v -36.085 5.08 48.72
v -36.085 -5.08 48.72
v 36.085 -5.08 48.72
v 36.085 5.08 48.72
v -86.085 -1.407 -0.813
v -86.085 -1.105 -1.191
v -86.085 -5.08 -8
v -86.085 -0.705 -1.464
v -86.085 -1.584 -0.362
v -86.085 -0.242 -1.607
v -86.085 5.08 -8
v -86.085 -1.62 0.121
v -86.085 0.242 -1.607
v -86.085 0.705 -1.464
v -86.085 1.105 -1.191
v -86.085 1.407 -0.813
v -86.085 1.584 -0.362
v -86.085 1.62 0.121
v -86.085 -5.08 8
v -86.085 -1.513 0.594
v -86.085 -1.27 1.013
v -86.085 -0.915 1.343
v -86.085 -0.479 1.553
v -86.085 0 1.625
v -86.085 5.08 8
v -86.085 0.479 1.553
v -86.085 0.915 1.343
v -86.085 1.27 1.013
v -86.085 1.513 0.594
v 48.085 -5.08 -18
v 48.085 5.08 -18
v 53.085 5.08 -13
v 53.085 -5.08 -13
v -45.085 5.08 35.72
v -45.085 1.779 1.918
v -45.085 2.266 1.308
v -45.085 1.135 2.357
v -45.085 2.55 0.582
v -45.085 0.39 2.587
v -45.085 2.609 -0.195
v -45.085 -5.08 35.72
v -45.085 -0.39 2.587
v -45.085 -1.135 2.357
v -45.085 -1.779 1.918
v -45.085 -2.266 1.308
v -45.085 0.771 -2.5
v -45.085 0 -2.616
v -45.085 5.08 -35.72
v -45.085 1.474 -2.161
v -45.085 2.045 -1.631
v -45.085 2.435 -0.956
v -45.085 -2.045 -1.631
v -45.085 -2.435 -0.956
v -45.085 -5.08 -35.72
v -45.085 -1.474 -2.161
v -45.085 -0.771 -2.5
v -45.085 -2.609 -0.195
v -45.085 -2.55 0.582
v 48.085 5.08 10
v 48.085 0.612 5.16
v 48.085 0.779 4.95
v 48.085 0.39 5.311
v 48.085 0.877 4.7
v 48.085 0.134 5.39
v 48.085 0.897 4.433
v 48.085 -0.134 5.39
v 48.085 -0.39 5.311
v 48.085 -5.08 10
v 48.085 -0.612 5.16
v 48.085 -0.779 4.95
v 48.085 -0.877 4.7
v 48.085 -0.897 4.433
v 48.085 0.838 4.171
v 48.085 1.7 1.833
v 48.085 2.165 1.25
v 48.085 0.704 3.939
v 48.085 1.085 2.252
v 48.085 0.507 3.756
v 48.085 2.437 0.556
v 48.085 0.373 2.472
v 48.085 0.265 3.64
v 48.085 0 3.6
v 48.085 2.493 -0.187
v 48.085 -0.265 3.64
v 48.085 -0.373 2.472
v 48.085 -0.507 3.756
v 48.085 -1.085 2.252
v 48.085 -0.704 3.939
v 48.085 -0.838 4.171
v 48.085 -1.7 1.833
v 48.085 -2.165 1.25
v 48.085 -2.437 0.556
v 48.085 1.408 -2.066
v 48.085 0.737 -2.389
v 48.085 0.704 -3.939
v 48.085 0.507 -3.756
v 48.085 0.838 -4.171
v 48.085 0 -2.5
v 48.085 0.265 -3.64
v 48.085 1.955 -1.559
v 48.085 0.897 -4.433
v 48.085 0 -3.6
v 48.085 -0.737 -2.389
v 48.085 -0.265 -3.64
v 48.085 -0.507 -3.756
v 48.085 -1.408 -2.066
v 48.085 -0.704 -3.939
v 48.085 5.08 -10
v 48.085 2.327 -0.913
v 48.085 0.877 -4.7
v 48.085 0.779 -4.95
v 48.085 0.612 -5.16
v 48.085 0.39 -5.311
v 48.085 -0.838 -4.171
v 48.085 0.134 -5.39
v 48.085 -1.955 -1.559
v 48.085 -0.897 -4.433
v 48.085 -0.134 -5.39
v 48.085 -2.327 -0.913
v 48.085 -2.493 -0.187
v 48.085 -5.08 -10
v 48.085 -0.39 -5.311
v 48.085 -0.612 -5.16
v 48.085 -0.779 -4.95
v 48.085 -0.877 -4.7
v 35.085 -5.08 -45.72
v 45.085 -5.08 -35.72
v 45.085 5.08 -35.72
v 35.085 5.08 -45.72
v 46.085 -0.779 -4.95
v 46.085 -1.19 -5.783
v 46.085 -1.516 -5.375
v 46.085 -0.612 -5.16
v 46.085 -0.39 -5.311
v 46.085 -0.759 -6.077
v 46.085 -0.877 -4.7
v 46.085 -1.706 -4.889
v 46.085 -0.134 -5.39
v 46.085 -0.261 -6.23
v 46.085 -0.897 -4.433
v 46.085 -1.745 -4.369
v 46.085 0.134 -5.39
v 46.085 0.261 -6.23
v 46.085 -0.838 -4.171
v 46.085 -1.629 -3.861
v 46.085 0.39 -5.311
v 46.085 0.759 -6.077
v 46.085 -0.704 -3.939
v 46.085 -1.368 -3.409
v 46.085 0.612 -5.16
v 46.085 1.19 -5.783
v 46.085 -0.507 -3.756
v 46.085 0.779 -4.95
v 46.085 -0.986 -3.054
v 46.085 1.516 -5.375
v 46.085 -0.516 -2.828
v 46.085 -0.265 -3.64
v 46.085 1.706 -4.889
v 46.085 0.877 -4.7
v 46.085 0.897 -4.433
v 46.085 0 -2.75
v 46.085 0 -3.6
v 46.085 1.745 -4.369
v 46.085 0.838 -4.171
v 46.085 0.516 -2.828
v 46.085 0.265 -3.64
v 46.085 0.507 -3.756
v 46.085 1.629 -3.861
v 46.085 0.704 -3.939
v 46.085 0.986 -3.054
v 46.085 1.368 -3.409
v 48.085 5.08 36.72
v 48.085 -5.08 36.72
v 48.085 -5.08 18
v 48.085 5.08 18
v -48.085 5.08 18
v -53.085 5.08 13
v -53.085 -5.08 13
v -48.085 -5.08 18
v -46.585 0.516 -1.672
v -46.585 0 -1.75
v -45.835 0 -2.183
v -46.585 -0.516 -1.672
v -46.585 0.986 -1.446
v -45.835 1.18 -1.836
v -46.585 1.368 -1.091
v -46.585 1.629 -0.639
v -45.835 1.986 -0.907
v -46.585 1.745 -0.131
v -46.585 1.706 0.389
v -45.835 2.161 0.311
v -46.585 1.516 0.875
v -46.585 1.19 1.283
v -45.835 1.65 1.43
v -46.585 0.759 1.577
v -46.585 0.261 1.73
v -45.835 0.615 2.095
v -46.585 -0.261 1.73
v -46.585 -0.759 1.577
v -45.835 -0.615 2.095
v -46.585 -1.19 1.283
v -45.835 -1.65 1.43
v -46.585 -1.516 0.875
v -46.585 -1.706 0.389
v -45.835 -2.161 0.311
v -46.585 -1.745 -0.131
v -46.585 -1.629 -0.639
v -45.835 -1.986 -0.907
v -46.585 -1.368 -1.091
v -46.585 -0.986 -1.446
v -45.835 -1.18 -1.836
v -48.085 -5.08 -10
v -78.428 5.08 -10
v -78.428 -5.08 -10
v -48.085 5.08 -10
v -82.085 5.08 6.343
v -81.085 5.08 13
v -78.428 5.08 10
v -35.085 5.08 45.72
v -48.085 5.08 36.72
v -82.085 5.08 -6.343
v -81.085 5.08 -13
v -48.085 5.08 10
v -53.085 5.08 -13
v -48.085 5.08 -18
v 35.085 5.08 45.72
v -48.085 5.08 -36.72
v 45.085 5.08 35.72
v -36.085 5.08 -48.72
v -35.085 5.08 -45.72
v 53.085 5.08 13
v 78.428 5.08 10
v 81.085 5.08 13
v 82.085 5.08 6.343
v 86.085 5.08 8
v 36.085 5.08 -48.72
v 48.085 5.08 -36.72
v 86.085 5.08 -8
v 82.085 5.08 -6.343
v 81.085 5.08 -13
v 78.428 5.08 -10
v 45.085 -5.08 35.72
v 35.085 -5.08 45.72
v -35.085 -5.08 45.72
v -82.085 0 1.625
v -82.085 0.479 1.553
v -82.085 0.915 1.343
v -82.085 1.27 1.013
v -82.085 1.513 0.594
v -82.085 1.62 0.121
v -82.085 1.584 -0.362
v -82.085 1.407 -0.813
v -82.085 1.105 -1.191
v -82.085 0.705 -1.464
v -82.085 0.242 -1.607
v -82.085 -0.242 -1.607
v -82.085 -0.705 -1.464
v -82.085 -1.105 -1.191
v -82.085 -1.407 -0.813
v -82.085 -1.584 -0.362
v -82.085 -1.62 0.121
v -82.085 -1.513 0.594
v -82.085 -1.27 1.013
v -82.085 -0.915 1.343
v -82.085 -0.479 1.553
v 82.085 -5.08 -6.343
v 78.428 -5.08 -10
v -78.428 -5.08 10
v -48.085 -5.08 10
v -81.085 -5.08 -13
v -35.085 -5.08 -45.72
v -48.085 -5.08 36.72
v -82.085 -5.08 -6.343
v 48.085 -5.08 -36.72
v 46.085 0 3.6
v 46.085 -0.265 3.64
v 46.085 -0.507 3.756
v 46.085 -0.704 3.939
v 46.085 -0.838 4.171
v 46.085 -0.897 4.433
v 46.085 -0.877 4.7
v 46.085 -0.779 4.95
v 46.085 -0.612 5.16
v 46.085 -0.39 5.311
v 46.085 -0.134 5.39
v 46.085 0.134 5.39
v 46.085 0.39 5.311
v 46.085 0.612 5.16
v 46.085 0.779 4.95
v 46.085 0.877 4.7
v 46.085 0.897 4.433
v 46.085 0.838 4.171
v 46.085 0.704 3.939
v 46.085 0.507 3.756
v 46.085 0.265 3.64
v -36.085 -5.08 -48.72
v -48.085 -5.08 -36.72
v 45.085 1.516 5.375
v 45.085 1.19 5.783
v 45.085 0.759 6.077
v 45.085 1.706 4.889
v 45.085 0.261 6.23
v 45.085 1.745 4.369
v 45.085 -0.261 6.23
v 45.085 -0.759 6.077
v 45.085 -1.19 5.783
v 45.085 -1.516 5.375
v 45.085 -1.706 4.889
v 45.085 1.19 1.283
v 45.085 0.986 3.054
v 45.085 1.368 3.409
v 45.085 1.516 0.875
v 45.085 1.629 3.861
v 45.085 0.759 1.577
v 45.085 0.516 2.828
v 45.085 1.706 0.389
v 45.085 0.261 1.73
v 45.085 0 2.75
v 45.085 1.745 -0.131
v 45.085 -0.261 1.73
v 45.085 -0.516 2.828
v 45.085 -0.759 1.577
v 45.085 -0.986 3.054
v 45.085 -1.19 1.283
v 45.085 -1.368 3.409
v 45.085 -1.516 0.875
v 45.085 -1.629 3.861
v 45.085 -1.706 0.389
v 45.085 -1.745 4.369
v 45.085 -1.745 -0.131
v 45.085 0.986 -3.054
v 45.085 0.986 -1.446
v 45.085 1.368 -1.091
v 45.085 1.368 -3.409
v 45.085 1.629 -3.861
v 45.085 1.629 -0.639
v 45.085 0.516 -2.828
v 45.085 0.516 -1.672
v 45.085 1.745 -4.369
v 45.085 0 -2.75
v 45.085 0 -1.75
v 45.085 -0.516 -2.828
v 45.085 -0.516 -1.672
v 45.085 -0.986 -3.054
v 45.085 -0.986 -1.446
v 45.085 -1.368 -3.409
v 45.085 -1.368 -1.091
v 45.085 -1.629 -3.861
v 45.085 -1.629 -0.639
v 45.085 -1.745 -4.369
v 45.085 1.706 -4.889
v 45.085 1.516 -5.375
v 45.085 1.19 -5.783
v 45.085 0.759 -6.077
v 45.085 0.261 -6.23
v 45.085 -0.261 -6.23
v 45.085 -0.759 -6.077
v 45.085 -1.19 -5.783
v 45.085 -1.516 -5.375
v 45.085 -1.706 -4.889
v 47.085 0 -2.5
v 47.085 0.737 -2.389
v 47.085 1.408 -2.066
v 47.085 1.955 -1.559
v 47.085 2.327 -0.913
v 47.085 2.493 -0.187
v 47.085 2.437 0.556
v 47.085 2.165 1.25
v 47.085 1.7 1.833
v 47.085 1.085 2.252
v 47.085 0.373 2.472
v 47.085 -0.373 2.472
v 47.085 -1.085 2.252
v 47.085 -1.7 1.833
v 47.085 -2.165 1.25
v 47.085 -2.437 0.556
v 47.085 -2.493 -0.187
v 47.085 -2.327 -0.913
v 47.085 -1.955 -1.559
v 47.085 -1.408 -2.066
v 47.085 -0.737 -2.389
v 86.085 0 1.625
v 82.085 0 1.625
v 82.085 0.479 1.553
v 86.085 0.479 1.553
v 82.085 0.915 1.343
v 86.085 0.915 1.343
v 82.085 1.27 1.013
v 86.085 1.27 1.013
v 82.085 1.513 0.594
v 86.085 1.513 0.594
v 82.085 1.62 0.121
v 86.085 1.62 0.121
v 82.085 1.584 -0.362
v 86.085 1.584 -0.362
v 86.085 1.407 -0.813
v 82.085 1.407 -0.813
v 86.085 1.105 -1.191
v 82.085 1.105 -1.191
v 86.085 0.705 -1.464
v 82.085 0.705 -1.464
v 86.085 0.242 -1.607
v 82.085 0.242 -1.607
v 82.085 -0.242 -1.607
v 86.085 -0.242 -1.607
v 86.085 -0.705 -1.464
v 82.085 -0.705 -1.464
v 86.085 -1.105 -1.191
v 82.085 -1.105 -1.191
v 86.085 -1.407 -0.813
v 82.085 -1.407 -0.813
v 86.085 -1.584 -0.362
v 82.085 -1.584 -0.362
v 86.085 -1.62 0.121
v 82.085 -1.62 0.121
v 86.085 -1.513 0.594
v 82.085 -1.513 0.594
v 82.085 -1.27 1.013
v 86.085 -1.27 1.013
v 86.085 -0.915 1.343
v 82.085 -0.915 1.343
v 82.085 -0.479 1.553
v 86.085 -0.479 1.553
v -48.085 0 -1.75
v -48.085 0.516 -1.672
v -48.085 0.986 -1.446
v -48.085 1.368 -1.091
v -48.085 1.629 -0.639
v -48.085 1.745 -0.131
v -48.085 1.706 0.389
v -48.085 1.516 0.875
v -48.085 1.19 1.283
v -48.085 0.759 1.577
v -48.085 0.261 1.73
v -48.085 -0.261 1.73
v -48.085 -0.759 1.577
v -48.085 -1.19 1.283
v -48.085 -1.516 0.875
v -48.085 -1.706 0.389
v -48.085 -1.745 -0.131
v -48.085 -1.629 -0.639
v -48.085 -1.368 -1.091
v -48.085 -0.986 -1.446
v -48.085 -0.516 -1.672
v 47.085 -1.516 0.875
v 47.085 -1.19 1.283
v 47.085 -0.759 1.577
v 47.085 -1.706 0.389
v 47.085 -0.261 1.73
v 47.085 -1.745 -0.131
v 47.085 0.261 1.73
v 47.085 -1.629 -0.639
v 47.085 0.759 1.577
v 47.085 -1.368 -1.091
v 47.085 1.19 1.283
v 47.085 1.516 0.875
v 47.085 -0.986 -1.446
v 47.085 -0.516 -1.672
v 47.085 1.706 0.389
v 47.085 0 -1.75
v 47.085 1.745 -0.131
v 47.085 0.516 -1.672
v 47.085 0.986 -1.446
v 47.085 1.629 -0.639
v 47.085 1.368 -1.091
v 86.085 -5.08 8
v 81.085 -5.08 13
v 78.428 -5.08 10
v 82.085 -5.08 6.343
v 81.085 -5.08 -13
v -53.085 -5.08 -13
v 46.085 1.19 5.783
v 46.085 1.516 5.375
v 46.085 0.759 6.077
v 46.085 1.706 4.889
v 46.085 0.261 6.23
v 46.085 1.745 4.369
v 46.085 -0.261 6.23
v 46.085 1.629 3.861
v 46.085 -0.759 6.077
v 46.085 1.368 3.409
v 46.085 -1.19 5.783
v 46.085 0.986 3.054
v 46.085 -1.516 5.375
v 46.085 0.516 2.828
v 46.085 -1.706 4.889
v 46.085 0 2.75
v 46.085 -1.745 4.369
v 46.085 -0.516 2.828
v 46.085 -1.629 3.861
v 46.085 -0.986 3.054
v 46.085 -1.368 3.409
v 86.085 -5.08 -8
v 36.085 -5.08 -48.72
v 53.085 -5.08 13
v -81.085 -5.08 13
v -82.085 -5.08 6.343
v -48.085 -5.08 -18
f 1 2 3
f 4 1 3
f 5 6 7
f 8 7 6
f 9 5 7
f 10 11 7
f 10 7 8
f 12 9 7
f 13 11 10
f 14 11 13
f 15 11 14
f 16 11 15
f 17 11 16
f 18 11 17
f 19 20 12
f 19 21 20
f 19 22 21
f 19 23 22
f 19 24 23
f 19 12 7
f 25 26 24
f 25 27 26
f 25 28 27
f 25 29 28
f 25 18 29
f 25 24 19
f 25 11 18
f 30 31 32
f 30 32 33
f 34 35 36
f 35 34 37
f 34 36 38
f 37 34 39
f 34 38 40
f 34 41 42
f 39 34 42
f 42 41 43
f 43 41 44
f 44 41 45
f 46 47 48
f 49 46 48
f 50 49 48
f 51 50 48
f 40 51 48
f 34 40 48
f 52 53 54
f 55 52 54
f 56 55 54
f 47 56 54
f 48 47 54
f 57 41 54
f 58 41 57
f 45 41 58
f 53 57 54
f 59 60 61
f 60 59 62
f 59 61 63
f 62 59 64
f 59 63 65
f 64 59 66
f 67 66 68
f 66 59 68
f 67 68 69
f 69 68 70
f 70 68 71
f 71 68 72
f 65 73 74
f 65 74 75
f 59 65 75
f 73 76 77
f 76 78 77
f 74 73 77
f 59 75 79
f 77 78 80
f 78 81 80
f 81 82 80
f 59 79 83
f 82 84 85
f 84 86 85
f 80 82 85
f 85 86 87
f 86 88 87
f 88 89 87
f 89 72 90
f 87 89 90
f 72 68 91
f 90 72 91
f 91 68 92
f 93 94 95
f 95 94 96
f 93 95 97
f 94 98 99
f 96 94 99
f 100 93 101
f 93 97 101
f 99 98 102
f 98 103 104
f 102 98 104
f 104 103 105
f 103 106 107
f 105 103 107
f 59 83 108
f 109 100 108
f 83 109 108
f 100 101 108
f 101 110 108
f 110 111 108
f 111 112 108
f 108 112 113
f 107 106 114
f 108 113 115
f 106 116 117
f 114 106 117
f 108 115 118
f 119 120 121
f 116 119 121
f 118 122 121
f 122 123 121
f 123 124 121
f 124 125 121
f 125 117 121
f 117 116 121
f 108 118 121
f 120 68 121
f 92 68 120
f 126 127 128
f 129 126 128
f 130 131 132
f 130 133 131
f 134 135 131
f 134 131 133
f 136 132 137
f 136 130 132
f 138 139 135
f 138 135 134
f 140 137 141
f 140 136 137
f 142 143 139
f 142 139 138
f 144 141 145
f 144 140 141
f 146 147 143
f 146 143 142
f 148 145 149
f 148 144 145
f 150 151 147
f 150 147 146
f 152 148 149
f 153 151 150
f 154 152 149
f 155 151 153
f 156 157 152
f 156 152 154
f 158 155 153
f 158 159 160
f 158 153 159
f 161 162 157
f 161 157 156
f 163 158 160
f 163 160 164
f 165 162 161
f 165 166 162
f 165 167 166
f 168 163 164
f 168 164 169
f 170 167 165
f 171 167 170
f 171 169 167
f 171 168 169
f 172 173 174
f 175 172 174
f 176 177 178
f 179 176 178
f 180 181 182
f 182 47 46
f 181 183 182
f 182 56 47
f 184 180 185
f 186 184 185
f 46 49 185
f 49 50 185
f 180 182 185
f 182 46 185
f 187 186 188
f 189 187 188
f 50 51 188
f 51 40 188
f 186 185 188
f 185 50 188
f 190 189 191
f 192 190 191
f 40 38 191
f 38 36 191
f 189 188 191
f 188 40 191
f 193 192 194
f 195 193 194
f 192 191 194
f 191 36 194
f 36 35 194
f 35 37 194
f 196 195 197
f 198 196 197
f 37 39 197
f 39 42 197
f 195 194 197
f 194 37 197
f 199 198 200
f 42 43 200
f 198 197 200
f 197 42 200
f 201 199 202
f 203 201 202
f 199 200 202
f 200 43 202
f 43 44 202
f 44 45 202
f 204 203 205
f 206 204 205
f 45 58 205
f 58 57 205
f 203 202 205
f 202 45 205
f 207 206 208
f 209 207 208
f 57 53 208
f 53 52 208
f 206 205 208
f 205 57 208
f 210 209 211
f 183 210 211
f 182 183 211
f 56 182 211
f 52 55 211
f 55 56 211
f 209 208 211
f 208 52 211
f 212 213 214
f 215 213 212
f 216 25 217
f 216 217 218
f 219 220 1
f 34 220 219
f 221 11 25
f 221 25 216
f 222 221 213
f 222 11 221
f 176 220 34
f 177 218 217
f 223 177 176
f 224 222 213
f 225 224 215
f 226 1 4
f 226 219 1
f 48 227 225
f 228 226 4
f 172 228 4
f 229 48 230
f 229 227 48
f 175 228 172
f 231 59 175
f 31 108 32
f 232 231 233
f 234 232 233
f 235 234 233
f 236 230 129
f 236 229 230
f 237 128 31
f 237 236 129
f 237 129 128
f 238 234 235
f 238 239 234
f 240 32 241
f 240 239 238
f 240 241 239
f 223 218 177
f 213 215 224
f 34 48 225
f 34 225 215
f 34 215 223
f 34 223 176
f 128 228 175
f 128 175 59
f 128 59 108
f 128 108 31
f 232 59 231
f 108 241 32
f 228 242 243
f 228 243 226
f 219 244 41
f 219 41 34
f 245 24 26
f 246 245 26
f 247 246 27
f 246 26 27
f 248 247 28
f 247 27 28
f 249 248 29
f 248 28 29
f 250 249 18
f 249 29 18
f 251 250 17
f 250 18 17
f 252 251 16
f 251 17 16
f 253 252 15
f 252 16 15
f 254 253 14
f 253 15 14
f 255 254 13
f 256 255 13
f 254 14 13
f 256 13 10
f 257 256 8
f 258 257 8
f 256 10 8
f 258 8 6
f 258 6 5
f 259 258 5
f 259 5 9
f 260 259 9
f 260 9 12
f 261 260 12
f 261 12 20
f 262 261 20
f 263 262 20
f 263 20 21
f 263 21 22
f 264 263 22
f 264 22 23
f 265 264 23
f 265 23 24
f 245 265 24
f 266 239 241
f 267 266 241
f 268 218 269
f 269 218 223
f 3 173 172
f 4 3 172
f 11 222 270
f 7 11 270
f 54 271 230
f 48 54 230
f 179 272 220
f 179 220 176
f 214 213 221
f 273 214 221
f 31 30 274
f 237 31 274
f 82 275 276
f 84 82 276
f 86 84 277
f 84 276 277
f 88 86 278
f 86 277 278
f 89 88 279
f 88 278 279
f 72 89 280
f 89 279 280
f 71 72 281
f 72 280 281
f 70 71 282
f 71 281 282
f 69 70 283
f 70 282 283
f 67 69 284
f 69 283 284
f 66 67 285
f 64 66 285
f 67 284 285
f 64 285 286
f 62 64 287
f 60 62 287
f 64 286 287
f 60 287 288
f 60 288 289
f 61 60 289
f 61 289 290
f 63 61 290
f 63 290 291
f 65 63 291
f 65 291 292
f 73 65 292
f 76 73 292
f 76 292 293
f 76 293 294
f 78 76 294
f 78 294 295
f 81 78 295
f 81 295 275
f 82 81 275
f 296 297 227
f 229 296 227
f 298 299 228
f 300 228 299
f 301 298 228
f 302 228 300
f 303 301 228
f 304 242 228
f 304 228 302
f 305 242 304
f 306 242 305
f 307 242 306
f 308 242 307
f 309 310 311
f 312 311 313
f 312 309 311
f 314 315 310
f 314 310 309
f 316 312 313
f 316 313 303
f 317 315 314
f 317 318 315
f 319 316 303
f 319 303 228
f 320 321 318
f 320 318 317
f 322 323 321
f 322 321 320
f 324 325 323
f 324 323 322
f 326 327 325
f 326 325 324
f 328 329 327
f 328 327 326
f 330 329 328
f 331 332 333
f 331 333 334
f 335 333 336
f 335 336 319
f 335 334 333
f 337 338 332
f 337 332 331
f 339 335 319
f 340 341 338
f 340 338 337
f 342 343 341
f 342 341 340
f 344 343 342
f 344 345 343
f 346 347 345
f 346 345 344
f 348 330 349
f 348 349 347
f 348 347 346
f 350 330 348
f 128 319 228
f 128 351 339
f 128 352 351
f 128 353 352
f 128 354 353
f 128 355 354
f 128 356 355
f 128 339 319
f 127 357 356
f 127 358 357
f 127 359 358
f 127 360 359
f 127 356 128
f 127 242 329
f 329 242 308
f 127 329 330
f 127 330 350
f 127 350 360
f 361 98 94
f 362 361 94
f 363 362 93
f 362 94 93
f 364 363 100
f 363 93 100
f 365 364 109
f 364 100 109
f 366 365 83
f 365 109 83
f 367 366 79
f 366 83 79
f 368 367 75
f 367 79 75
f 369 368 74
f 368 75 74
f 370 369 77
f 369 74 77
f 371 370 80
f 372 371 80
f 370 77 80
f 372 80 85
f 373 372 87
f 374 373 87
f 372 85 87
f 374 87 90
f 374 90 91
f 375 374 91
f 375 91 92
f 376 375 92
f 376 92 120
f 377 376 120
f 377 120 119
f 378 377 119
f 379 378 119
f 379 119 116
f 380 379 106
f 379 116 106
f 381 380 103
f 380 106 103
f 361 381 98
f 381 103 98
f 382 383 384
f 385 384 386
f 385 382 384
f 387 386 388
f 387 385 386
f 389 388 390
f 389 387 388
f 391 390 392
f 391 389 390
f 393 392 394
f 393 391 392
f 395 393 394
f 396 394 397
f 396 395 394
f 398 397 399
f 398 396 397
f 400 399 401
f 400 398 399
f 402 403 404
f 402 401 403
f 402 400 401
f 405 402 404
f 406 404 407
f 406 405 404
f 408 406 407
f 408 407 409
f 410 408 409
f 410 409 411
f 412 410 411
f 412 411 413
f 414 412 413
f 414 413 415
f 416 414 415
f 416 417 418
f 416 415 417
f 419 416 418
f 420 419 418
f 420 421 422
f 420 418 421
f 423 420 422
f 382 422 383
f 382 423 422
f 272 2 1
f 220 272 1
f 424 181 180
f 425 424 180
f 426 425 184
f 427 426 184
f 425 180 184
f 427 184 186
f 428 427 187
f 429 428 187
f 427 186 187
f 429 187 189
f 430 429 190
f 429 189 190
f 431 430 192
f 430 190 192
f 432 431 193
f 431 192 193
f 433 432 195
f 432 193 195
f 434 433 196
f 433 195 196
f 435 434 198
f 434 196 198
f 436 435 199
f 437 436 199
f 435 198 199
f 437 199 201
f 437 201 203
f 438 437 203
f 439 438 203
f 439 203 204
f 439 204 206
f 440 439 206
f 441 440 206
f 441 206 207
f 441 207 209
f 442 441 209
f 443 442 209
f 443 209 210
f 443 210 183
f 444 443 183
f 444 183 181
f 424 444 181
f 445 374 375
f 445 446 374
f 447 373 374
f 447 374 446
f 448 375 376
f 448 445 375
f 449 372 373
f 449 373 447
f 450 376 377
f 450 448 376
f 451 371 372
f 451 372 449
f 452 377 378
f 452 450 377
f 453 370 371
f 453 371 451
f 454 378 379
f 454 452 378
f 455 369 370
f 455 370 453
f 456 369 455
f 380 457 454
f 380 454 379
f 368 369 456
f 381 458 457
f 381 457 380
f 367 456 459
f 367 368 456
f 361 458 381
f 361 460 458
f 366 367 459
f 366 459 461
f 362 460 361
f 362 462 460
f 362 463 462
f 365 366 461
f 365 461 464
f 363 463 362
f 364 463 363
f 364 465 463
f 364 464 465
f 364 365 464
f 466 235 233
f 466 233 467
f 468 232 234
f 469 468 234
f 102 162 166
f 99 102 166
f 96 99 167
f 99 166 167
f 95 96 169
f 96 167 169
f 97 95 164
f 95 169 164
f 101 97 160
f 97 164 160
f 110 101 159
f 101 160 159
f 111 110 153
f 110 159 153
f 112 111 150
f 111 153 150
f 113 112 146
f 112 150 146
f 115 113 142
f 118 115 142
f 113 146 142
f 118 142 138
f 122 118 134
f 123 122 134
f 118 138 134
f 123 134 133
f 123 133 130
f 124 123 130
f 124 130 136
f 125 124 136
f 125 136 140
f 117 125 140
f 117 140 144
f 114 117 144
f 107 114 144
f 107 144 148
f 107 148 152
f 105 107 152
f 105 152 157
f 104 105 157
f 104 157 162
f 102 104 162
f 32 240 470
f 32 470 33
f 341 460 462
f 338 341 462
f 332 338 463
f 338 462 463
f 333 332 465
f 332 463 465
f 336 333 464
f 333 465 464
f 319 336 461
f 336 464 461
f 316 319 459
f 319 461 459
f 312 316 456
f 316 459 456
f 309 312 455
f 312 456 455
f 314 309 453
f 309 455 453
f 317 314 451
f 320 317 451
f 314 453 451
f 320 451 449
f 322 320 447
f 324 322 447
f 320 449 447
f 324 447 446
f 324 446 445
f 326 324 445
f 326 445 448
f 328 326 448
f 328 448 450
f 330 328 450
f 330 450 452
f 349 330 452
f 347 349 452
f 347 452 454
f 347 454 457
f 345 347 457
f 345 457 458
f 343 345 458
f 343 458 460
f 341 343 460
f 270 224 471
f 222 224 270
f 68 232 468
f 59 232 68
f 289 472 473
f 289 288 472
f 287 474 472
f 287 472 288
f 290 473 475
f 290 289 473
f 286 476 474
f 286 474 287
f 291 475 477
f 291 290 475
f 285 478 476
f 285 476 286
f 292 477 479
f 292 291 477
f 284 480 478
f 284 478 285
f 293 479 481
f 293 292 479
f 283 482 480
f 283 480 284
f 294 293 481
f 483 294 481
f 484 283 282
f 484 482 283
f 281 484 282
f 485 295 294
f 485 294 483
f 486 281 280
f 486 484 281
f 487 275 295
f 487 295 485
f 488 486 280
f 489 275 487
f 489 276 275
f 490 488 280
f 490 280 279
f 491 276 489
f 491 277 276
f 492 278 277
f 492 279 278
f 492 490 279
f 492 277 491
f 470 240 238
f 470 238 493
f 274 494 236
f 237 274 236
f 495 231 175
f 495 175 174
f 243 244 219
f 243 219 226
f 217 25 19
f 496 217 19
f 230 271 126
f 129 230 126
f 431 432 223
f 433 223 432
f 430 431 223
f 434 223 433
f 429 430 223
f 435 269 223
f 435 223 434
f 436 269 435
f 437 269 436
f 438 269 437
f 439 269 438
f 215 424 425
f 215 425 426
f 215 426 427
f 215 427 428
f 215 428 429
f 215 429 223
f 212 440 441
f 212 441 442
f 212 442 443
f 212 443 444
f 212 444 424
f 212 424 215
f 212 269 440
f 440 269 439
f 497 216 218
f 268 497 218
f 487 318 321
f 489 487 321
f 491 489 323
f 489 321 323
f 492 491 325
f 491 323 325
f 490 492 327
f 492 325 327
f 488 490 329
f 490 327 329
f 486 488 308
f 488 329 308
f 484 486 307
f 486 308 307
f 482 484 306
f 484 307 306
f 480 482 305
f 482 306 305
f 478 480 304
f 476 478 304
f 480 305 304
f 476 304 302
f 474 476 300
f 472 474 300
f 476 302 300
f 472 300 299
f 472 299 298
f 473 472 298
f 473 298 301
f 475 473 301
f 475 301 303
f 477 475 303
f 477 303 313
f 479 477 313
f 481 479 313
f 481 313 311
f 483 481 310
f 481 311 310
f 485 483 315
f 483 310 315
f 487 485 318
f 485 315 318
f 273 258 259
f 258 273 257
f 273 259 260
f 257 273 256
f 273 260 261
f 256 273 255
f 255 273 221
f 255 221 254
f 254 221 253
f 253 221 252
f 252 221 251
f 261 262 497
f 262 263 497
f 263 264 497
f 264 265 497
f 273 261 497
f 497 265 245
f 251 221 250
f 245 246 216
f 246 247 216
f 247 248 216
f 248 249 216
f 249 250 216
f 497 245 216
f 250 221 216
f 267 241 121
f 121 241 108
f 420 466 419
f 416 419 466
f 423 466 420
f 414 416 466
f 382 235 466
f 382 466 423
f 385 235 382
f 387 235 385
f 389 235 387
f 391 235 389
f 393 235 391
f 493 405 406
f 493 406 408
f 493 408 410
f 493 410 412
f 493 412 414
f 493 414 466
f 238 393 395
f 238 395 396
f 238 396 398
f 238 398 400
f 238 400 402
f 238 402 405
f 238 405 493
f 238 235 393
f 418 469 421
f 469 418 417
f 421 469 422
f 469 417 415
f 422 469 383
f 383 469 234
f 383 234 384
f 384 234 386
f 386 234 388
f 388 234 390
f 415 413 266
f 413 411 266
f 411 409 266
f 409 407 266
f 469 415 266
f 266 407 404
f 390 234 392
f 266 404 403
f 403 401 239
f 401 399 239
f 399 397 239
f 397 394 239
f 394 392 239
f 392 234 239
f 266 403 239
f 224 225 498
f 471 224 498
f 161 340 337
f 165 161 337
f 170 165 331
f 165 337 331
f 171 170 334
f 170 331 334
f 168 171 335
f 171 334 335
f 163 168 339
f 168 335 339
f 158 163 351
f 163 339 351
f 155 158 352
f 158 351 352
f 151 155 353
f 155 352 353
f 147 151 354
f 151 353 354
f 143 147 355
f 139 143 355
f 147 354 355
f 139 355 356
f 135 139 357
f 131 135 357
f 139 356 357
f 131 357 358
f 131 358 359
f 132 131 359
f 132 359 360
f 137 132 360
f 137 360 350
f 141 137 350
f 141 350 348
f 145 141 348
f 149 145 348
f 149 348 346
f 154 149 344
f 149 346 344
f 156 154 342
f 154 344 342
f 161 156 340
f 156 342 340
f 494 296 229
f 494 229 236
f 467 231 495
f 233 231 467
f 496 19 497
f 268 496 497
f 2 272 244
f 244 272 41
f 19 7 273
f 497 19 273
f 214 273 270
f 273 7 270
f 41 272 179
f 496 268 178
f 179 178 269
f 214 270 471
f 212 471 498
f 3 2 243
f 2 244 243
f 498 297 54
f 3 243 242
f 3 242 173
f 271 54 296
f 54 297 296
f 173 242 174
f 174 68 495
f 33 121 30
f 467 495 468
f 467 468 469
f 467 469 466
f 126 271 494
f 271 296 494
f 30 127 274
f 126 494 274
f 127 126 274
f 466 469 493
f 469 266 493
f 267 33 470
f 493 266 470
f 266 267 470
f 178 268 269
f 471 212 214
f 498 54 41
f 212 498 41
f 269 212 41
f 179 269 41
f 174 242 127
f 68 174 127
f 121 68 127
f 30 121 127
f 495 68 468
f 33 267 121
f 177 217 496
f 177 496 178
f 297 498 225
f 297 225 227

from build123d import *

# Parameters (mm, degrees)
BOSS_EXTRUDE1_DEPTH      = 5.08
BOSS_EXTRUDE1_DEPTH_BACK = 5.08
SKETCH2_W                = 96.17
SKETCH2_H                = 97.44
SKETCH2_W_2              = 90.17
SKETCH2_H_2              = 91.44
SKETCH3_R                = 1.75
CUT_EXTRUDE1_DEPTH       = 108.926427255
SKETCH4_R                = 1.75
CUT_EXTRUDE2_DEPTH       = 1
SKETCH5_R                = 0.9
CUT_EXTRUDE3_DEPTH       = 107.148168613
SKETCH6_R                = 2.5
CUT_EXTRUDE4_DEPTH       = 1
BOSS_EXTRUDE2_DEPTH      = 10.16
CHAMFER1_SIZE            = 1.5
CHAMFER1_SIZE2           = 0.866025404
SKETCH9_R                = 1.625
CUT_EXTRUDE5_DEPTH       = 5
CHAMFER3_SIZE            = 10
CHAMFER4_SIZE            = 12
CHAMFER5_SIZE            = 5
CUT_EXTRUDE6_DEPTH       = 100.435864883


with BuildPart() as part:
    # Sketch2 → Boss-Extrude1 (new, two sides: drawn at the far end of the back side and taken through both)
    with BuildSketch(Plane(origin=(0, 0, 0), x_dir=(1, 0, 0), z_dir=(0, 1, 0)).offset(-BOSS_EXTRUDE1_DEPTH_BACK)):
        Rectangle(SKETCH2_W, SKETCH2_H)
        Rectangle(SKETCH2_W_2, SKETCH2_H_2, mode=Mode.SUBTRACT)
    extrude(amount=BOSS_EXTRUDE1_DEPTH + BOSS_EXTRUDE1_DEPTH_BACK)

    # Sketch3 → Cut-Extrude1 (cut, through all)
    with BuildSketch(Plane(origin=(48.085, 0, 0), x_dir=(0, 0, -1), z_dir=(1, 0, 0))):
        Circle(SKETCH3_R)
    extrude(amount=-CUT_EXTRUDE1_DEPTH, mode=Mode.SUBTRACT)

    # Sketch4 → Cut-Extrude2 (cut)
    with BuildSketch(Plane.ZY.offset(-45.085)):
        with Locations((-4.5, 0)):
            Circle(SKETCH4_R)
        with Locations(Location((4.5, 0, 0), (0, 0, 180))):
            Circle(SKETCH4_R)
    extrude(amount=-CUT_EXTRUDE2_DEPTH, mode=Mode.SUBTRACT)

    # Sketch5 → Cut-Extrude3 (cut, through all)
    with BuildSketch(Plane.ZY.offset(-46.085)):
        with Locations((-4.5, 0)):
            Circle(SKETCH5_R)
        with Locations(Location((4.5, 0, 0), (0, 0, 180))):
            Circle(SKETCH5_R)
    extrude(amount=-CUT_EXTRUDE3_DEPTH, mode=Mode.SUBTRACT)

    # Sketch6 → Cut-Extrude4 (cut)
    with BuildSketch(Plane(origin=(48.085, 0, 0), x_dir=(0, 0, -1), z_dir=(1, 0, 0))):
        Circle(SKETCH6_R)
    extrude(amount=-CUT_EXTRUDE4_DEPTH, mode=Mode.SUBTRACT)

    # Sketch8 → Boss-Extrude2 (add)
    with BuildSketch(Plane(origin=(0, 5.08, 0), x_dir=(1, 0, 0), z_dir=(0, 1, 0))):
        Polygon((48.085, -13), (86.085, -13), (86.085, 13), (48.085, 13), (48.085, 10), (78.085, 10), (78.085, -10), (48.085, -10), align=None)
        Polygon((-86.085, 13), (-86.085, -13), (-48.085, -13), (-48.085, -10), (-78.085, -10), (-78.085, 10), (-48.085, 10), (-48.085, 13), align=None)
    extrude(amount=-BOSS_EXTRUDE2_DEPTH)

    # Chamfer1
    chamfer1_edges = [part.edges().sort_by_distance(p)[0] for p in [
        (-45.085, 0, 1.75),
    ]]
    chamfer1_side = [part.faces().sort_by_distance(p)[0] for p in [
        (-46.585, 0, 1.75),
    ]]
    chamfer(chamfer1_edges, length=CHAMFER1_SIZE, length2=CHAMFER1_SIZE2, reference=chamfer1_side[0])

    # Sketch9 → Cut-Extrude5 (cut)
    with BuildSketch(Plane.ZY.offset(86.085)):
        Circle(SKETCH9_R)
    cut_extrude5 = extrude(amount=-CUT_EXTRUDE5_DEPTH, mode=Mode.SUBTRACT)

    # Mirror2: Cut-Extrude5 across plane
    add(cut_extrude5.mirror(Plane(origin=(0, 0, 0), x_dir=(0, 0, 1), z_dir=(1, 0, 0))), mode=Mode.SUBTRACT)

    # Chamfer3
    chamfer3_edges = [part.edges().sort_by_distance(p)[0] for p in [
        (45.085, 0, -45.72),
        (45.085, 0, 45.72),
        (-45.085, 0, 45.72),
        (-45.085, 0, -45.72),
    ]]
    chamfer(chamfer3_edges, length=CHAMFER3_SIZE)

    # Chamfer4
    chamfer4_edges = [part.edges().sort_by_distance(p)[0] for p in [
        (-48.085, 0, -48.72),
        (48.085, 0, -48.72),
        (48.085, 0, 48.72),
        (-48.085, 0, 48.72),
    ]]
    chamfer(chamfer4_edges, length=CHAMFER4_SIZE)

    # Chamfer5
    chamfer5_edges = [part.edges().sort_by_distance(p)[0] for p in [
        (86.085, 0, 13),
        (48.085, 0, 13),
        (48.085, 0, -13),
        (86.085, 0, -13),
        (-86.085, 0, 13),
        (-48.085, 0, 13),
        (-48.085, 0, -13),
        (-86.085, 0, -13),
    ]]
    chamfer(chamfer5_edges, length=CHAMFER5_SIZE)

    # Sketch10 → Cut-Extrude6 (cut, through all)
    with BuildSketch(Plane(origin=(0, 5.08, 0), x_dir=(1, 0, 0), z_dir=(0, 1, 0))):
        Polygon((78.085, 10), (78.085, -10), (78.428145751, -10), (82.085, -6.343145751), (82.085, 6.343145751), (78.428145751, 10), align=None)
        Polygon((-82.085, -6.343145751), (-78.428145751, -10), (-78.085, -10), (-78.085, 10), (-78.428145751, 10), (-82.085, 6.343145751), align=None)
    extrude(amount=-CUT_EXTRUDE6_DEPTH, mode=Mode.SUBTRACT)


solid = part.part
